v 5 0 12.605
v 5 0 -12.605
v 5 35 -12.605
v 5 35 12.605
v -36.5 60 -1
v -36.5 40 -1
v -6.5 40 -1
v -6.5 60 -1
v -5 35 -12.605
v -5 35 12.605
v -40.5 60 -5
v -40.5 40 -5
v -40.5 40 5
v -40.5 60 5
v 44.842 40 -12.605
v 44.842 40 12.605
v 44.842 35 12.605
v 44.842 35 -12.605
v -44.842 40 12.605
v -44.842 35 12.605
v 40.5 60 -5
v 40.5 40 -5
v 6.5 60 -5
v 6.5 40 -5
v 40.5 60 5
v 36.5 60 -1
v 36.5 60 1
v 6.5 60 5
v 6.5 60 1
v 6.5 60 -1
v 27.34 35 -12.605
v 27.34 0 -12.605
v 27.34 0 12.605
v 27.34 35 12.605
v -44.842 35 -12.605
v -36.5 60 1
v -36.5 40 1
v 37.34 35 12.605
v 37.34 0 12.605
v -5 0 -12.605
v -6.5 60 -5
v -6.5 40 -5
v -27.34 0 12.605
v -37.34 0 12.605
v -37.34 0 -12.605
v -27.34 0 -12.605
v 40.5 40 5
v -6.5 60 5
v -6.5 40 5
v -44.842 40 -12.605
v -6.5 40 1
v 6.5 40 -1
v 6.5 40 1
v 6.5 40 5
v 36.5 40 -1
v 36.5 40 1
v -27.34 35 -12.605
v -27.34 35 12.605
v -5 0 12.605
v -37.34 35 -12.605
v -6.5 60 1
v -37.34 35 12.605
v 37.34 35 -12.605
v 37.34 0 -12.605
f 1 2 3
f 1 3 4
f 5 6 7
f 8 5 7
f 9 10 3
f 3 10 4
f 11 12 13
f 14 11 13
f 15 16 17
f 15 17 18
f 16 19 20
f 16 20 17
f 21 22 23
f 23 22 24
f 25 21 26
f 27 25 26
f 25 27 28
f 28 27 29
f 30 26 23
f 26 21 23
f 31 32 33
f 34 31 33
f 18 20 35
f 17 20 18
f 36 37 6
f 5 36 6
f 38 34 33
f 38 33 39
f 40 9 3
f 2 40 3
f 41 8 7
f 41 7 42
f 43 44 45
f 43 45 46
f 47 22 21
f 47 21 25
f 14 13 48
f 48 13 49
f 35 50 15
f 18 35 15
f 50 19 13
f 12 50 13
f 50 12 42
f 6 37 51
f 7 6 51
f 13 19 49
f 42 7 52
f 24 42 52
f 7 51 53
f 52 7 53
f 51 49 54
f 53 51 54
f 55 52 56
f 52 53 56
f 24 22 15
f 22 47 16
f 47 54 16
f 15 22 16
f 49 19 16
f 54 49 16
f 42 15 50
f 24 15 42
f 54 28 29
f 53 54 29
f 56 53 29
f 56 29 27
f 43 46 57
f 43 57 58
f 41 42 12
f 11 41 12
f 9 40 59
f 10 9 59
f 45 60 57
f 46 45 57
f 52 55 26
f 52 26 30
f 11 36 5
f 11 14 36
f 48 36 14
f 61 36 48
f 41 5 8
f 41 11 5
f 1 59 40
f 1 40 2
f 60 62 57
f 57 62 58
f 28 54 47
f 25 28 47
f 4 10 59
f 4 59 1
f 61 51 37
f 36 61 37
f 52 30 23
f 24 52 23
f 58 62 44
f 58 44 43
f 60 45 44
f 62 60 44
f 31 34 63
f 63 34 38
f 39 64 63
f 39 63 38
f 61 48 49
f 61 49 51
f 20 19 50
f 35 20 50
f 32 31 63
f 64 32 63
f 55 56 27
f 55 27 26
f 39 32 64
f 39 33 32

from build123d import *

# Parameters (mm, degrees)
SKETCH1_W            = 140
SKETCH1_H            = 100
BOSS_EXTRUDE2_DEPTH  = 40
BOSS_EXTRUDE2_TAPER  = 20
SHELL1_T             = -5
BOSS_EXTRUDE3_REACH  = 96.868
SKETCH4_W            = 10
SKETCH4_H            = 89.358222276
SKETCH8_W            = 10
SKETCH8_H            = 10
BOSS_EXTRUDE4_DEPTH  = 30
BOSS_EXTRUDE5_REACH  = 126.987
BOSS_EXTRUDE6_DEPTH  = 20
SKETCH13_R           = 3.25
CUT_EXTRUDE2_DEPTH   = 129.840987391
SKETCH14_R           = 3.25
CUT_EXTRUDE3_DEPTH   = 111.905365172
SKETCH15_OUTSIDE_W   = 180.832
SKETCH15_OUTSIDE_H   = 140.832
SKETCH15_OUTSIDE_W_2 = 89.684431162
SKETCH15_OUTSIDE_H_2 = 25.21083088
CUT_EXTRUDE6_DEPTH   = 111.905365172


with BuildPart() as part:
    # Sketch1 → Boss-Extrude2 (new body)
    with BuildSketch(Plane(origin=(0, 0, 0), x_dir=(1, 0, 0), z_dir=(0, 1, 0))):
        Rectangle(SKETCH1_W, SKETCH1_H)
    extrude(amount=BOSS_EXTRUDE2_DEPTH, taper=BOSS_EXTRUDE2_TAPER)

    # Shell1
    shell1_openings = [part.faces().sort_by_distance(p)[0] for p in [
        (0, 0, 0),
    ]]
    offset(amount=SHELL1_T, openings=shell1_openings, kind=Kind.INTERSECTION)


with BuildPart() as body_2:

    # Sketch4 → Boss-Extrude3 (new, up to next)
    with BuildSketch(Plane.XZ, mode=Mode.PRIVATE) as boss_extrude3_sk1:
        with Locations((-32.339555569, 0)):
            Rectangle(SKETCH4_W, SKETCH4_H)
    boss_extrude3_tool1 = extrude(boss_extrude3_sk1.sketch, amount=-BOSS_EXTRUDE3_REACH, mode=Mode.PRIVATE) - part.part
    # Sketch4 → Boss-Extrude3 (new, up to next)
    with BuildSketch(Plane.XZ, mode=Mode.PRIVATE) as boss_extrude3_sk2:
        with Locations((32.339555569, 0)):
            Rectangle(SKETCH4_W, SKETCH4_H)
    boss_extrude3_tool2 = extrude(boss_extrude3_sk2.sketch, amount=-BOSS_EXTRUDE3_REACH, mode=Mode.PRIVATE) - part.part
    # Sketch4 → Boss-Extrude3 (new, up to next)
    with BuildSketch(Plane.XZ, mode=Mode.PRIVATE) as boss_extrude3_sk3:
        Rectangle(SKETCH4_W, SKETCH4_H)
    boss_extrude3_tool3 = extrude(boss_extrude3_sk3.sketch, amount=-BOSS_EXTRUDE3_REACH, mode=Mode.PRIVATE) - part.part
    add(boss_extrude3_tool1.solids().sort_by_distance((-32.339556, 0, 0))[0])
    add(boss_extrude3_tool2.solids().sort_by_distance((32.339556, 0, 0))[0])
    add(boss_extrude3_tool3.solids().sort_by_distance((0, 0, 0))[0])


with BuildPart() as part_1:
    add(part.part)

    # Sketch8 → Boss-Extrude4 (add)
    with BuildSketch(Plane.XZ):
        with Locations((-32.339555569, 45)):
            Rectangle(SKETCH8_W, SKETCH8_H)
        with Locations((32.339555569, 45)):
            Rectangle(SKETCH8_W, SKETCH8_H)
    extrude(amount=BOSS_EXTRUDE4_DEPTH)

    # Boss-Extrude5: up to this face of the body (flat: up to its plane)
    boss_extrude5_end = Plane(body_2.part.faces().sort_by_distance((-37.339555569, 16.530131779, 0))[0])
    # Sketch9 → Boss-Extrude5 (add, up to the picked face)
    with BuildSketch(Plane(origin=(37.339555569, 0, 0), x_dir=(0, 0, -1), z_dir=(1, 0, 0)), mode=Mode.PRIVATE) as boss_extrude5_sk1:
        Polygon((-40, -15), (-25, 0), (-30, 0), (-40, -10), align=None)
    boss_extrude5_tool1 = split(extrude(boss_extrude5_sk1.sketch, amount=-BOSS_EXTRUDE5_REACH, mode=Mode.PRIVATE), bisect_by=boss_extrude5_end, keep=Keep.BOTH, mode=Mode.PRIVATE)
    add(boss_extrude5_tool1.solids().sort_by(Axis((37.339556, -6.333333, 33.666667), (-1, 0, 0)))[0])

    # Sketch12 → Boss-Extrude6 (add)
    with BuildSketch(Plane(origin=(0, 40, 0), x_dir=(1, 0, 0), z_dir=(0, 1, 0))):
        Polygon((-36.5, -1), (-36.5, 1), (-6.5, 1), (-6.5, 5), (-34.433278652, 5), (-40.5, 5), (-40.5, -5), (-36.5, -5), (-6.5, -5), (-6.5, -1), align=None)
        Polygon((40.5, 5), (40.5, -5), (36.5, -5), (6.5, -5), (6.5, -1), (36.5, -1), (36.5, 1), (6.5, 1), (6.5, 5), (34.433278652, 5), align=None)
    extrude(amount=BOSS_EXTRUDE6_DEPTH)

    # Sketch13 → Cut-Extrude2 (cut, through all)
    with BuildSketch(Plane(origin=(0, 0, 40), x_dir=(-1, 0, 0), z_dir=(0, 0, -1))):
        with Locations((-32.339555569, -22.5)):
            Circle(SKETCH13_R)
        with Locations(Location((32.339555569, -22.5, 0), (0, 0, 180))):
            Circle(SKETCH13_R)
    extrude(amount=-CUT_EXTRUDE2_DEPTH, mode=Mode.SUBTRACT)


with BuildPart() as cut_extrude3_tool:
    # Sketch14 → Cut-Extrude3 (new, through all)
    with BuildSketch(Plane(origin=(0, 40, 0), x_dir=(1, 0, 0), z_dir=(0, 1, 0))):
        with Locations(Location((-27.721190629, 23.631190629, 0), (0, 0, 270))):
            Circle(SKETCH14_R)
        with Locations(Location((27.721190629, 23.631190629, 0), (0, 0, 270))):
            Circle(SKETCH14_R)
        with BuildLine():
            ThreePointArc((3.25, -23.631190629), (2.298097039, -21.33309359), (0, -20.381190629))
            Line((0, -20.381190629), (0, -26.881190629))
            ThreePointArc((0, -26.881190629), (2.298097039, -25.929287668), (3.25, -23.631190629))
        make_face()
        with BuildLine():
            Line((0, -26.881190629), (0, -20.381190629))
            ThreePointArc((0, -20.381190629), (-3.25, -23.631190629), (0, -26.881190629))
        make_face()
    extrude(amount=-CUT_EXTRUDE3_DEPTH)


with BuildPart() as part_2:
    add(part_1.part)

    # Cut-Extrude3: cut by cut_extrude3_tool
    add(cut_extrude3_tool.part, mode=Mode.SUBTRACT)


with BuildPart() as body_2_1:
    add(body_2.part)

    # Cut-Extrude3: cut by cut_extrude3_tool
    add(cut_extrude3_tool.part, mode=Mode.SUBTRACT)


with BuildPart() as cut_extrude6_tool:
    # Sketch15 outside → Cut-Extrude6 (new, through all)
    with BuildSketch(Plane(origin=(0, 40, 0), x_dir=(1, 0, 0), z_dir=(0, 1, 0))):
        Rectangle(SKETCH15_OUTSIDE_W, SKETCH15_OUTSIDE_H)
        Rectangle(SKETCH15_OUTSIDE_W_2, SKETCH15_OUTSIDE_H_2, mode=Mode.SUBTRACT)
    extrude(amount=-CUT_EXTRUDE6_DEPTH)


with BuildPart() as part_3:
    add(part_2.part)

    # Cut-Extrude6: cut by cut_extrude6_tool
    add(cut_extrude6_tool.part, mode=Mode.SUBTRACT)


with BuildPart() as body_2_2:
    add(body_2_1.part)

    # Cut-Extrude6: cut by cut_extrude6_tool
    add(cut_extrude6_tool.part, mode=Mode.SUBTRACT)


solid = Compound([part_3.part, body_2_2.part])
